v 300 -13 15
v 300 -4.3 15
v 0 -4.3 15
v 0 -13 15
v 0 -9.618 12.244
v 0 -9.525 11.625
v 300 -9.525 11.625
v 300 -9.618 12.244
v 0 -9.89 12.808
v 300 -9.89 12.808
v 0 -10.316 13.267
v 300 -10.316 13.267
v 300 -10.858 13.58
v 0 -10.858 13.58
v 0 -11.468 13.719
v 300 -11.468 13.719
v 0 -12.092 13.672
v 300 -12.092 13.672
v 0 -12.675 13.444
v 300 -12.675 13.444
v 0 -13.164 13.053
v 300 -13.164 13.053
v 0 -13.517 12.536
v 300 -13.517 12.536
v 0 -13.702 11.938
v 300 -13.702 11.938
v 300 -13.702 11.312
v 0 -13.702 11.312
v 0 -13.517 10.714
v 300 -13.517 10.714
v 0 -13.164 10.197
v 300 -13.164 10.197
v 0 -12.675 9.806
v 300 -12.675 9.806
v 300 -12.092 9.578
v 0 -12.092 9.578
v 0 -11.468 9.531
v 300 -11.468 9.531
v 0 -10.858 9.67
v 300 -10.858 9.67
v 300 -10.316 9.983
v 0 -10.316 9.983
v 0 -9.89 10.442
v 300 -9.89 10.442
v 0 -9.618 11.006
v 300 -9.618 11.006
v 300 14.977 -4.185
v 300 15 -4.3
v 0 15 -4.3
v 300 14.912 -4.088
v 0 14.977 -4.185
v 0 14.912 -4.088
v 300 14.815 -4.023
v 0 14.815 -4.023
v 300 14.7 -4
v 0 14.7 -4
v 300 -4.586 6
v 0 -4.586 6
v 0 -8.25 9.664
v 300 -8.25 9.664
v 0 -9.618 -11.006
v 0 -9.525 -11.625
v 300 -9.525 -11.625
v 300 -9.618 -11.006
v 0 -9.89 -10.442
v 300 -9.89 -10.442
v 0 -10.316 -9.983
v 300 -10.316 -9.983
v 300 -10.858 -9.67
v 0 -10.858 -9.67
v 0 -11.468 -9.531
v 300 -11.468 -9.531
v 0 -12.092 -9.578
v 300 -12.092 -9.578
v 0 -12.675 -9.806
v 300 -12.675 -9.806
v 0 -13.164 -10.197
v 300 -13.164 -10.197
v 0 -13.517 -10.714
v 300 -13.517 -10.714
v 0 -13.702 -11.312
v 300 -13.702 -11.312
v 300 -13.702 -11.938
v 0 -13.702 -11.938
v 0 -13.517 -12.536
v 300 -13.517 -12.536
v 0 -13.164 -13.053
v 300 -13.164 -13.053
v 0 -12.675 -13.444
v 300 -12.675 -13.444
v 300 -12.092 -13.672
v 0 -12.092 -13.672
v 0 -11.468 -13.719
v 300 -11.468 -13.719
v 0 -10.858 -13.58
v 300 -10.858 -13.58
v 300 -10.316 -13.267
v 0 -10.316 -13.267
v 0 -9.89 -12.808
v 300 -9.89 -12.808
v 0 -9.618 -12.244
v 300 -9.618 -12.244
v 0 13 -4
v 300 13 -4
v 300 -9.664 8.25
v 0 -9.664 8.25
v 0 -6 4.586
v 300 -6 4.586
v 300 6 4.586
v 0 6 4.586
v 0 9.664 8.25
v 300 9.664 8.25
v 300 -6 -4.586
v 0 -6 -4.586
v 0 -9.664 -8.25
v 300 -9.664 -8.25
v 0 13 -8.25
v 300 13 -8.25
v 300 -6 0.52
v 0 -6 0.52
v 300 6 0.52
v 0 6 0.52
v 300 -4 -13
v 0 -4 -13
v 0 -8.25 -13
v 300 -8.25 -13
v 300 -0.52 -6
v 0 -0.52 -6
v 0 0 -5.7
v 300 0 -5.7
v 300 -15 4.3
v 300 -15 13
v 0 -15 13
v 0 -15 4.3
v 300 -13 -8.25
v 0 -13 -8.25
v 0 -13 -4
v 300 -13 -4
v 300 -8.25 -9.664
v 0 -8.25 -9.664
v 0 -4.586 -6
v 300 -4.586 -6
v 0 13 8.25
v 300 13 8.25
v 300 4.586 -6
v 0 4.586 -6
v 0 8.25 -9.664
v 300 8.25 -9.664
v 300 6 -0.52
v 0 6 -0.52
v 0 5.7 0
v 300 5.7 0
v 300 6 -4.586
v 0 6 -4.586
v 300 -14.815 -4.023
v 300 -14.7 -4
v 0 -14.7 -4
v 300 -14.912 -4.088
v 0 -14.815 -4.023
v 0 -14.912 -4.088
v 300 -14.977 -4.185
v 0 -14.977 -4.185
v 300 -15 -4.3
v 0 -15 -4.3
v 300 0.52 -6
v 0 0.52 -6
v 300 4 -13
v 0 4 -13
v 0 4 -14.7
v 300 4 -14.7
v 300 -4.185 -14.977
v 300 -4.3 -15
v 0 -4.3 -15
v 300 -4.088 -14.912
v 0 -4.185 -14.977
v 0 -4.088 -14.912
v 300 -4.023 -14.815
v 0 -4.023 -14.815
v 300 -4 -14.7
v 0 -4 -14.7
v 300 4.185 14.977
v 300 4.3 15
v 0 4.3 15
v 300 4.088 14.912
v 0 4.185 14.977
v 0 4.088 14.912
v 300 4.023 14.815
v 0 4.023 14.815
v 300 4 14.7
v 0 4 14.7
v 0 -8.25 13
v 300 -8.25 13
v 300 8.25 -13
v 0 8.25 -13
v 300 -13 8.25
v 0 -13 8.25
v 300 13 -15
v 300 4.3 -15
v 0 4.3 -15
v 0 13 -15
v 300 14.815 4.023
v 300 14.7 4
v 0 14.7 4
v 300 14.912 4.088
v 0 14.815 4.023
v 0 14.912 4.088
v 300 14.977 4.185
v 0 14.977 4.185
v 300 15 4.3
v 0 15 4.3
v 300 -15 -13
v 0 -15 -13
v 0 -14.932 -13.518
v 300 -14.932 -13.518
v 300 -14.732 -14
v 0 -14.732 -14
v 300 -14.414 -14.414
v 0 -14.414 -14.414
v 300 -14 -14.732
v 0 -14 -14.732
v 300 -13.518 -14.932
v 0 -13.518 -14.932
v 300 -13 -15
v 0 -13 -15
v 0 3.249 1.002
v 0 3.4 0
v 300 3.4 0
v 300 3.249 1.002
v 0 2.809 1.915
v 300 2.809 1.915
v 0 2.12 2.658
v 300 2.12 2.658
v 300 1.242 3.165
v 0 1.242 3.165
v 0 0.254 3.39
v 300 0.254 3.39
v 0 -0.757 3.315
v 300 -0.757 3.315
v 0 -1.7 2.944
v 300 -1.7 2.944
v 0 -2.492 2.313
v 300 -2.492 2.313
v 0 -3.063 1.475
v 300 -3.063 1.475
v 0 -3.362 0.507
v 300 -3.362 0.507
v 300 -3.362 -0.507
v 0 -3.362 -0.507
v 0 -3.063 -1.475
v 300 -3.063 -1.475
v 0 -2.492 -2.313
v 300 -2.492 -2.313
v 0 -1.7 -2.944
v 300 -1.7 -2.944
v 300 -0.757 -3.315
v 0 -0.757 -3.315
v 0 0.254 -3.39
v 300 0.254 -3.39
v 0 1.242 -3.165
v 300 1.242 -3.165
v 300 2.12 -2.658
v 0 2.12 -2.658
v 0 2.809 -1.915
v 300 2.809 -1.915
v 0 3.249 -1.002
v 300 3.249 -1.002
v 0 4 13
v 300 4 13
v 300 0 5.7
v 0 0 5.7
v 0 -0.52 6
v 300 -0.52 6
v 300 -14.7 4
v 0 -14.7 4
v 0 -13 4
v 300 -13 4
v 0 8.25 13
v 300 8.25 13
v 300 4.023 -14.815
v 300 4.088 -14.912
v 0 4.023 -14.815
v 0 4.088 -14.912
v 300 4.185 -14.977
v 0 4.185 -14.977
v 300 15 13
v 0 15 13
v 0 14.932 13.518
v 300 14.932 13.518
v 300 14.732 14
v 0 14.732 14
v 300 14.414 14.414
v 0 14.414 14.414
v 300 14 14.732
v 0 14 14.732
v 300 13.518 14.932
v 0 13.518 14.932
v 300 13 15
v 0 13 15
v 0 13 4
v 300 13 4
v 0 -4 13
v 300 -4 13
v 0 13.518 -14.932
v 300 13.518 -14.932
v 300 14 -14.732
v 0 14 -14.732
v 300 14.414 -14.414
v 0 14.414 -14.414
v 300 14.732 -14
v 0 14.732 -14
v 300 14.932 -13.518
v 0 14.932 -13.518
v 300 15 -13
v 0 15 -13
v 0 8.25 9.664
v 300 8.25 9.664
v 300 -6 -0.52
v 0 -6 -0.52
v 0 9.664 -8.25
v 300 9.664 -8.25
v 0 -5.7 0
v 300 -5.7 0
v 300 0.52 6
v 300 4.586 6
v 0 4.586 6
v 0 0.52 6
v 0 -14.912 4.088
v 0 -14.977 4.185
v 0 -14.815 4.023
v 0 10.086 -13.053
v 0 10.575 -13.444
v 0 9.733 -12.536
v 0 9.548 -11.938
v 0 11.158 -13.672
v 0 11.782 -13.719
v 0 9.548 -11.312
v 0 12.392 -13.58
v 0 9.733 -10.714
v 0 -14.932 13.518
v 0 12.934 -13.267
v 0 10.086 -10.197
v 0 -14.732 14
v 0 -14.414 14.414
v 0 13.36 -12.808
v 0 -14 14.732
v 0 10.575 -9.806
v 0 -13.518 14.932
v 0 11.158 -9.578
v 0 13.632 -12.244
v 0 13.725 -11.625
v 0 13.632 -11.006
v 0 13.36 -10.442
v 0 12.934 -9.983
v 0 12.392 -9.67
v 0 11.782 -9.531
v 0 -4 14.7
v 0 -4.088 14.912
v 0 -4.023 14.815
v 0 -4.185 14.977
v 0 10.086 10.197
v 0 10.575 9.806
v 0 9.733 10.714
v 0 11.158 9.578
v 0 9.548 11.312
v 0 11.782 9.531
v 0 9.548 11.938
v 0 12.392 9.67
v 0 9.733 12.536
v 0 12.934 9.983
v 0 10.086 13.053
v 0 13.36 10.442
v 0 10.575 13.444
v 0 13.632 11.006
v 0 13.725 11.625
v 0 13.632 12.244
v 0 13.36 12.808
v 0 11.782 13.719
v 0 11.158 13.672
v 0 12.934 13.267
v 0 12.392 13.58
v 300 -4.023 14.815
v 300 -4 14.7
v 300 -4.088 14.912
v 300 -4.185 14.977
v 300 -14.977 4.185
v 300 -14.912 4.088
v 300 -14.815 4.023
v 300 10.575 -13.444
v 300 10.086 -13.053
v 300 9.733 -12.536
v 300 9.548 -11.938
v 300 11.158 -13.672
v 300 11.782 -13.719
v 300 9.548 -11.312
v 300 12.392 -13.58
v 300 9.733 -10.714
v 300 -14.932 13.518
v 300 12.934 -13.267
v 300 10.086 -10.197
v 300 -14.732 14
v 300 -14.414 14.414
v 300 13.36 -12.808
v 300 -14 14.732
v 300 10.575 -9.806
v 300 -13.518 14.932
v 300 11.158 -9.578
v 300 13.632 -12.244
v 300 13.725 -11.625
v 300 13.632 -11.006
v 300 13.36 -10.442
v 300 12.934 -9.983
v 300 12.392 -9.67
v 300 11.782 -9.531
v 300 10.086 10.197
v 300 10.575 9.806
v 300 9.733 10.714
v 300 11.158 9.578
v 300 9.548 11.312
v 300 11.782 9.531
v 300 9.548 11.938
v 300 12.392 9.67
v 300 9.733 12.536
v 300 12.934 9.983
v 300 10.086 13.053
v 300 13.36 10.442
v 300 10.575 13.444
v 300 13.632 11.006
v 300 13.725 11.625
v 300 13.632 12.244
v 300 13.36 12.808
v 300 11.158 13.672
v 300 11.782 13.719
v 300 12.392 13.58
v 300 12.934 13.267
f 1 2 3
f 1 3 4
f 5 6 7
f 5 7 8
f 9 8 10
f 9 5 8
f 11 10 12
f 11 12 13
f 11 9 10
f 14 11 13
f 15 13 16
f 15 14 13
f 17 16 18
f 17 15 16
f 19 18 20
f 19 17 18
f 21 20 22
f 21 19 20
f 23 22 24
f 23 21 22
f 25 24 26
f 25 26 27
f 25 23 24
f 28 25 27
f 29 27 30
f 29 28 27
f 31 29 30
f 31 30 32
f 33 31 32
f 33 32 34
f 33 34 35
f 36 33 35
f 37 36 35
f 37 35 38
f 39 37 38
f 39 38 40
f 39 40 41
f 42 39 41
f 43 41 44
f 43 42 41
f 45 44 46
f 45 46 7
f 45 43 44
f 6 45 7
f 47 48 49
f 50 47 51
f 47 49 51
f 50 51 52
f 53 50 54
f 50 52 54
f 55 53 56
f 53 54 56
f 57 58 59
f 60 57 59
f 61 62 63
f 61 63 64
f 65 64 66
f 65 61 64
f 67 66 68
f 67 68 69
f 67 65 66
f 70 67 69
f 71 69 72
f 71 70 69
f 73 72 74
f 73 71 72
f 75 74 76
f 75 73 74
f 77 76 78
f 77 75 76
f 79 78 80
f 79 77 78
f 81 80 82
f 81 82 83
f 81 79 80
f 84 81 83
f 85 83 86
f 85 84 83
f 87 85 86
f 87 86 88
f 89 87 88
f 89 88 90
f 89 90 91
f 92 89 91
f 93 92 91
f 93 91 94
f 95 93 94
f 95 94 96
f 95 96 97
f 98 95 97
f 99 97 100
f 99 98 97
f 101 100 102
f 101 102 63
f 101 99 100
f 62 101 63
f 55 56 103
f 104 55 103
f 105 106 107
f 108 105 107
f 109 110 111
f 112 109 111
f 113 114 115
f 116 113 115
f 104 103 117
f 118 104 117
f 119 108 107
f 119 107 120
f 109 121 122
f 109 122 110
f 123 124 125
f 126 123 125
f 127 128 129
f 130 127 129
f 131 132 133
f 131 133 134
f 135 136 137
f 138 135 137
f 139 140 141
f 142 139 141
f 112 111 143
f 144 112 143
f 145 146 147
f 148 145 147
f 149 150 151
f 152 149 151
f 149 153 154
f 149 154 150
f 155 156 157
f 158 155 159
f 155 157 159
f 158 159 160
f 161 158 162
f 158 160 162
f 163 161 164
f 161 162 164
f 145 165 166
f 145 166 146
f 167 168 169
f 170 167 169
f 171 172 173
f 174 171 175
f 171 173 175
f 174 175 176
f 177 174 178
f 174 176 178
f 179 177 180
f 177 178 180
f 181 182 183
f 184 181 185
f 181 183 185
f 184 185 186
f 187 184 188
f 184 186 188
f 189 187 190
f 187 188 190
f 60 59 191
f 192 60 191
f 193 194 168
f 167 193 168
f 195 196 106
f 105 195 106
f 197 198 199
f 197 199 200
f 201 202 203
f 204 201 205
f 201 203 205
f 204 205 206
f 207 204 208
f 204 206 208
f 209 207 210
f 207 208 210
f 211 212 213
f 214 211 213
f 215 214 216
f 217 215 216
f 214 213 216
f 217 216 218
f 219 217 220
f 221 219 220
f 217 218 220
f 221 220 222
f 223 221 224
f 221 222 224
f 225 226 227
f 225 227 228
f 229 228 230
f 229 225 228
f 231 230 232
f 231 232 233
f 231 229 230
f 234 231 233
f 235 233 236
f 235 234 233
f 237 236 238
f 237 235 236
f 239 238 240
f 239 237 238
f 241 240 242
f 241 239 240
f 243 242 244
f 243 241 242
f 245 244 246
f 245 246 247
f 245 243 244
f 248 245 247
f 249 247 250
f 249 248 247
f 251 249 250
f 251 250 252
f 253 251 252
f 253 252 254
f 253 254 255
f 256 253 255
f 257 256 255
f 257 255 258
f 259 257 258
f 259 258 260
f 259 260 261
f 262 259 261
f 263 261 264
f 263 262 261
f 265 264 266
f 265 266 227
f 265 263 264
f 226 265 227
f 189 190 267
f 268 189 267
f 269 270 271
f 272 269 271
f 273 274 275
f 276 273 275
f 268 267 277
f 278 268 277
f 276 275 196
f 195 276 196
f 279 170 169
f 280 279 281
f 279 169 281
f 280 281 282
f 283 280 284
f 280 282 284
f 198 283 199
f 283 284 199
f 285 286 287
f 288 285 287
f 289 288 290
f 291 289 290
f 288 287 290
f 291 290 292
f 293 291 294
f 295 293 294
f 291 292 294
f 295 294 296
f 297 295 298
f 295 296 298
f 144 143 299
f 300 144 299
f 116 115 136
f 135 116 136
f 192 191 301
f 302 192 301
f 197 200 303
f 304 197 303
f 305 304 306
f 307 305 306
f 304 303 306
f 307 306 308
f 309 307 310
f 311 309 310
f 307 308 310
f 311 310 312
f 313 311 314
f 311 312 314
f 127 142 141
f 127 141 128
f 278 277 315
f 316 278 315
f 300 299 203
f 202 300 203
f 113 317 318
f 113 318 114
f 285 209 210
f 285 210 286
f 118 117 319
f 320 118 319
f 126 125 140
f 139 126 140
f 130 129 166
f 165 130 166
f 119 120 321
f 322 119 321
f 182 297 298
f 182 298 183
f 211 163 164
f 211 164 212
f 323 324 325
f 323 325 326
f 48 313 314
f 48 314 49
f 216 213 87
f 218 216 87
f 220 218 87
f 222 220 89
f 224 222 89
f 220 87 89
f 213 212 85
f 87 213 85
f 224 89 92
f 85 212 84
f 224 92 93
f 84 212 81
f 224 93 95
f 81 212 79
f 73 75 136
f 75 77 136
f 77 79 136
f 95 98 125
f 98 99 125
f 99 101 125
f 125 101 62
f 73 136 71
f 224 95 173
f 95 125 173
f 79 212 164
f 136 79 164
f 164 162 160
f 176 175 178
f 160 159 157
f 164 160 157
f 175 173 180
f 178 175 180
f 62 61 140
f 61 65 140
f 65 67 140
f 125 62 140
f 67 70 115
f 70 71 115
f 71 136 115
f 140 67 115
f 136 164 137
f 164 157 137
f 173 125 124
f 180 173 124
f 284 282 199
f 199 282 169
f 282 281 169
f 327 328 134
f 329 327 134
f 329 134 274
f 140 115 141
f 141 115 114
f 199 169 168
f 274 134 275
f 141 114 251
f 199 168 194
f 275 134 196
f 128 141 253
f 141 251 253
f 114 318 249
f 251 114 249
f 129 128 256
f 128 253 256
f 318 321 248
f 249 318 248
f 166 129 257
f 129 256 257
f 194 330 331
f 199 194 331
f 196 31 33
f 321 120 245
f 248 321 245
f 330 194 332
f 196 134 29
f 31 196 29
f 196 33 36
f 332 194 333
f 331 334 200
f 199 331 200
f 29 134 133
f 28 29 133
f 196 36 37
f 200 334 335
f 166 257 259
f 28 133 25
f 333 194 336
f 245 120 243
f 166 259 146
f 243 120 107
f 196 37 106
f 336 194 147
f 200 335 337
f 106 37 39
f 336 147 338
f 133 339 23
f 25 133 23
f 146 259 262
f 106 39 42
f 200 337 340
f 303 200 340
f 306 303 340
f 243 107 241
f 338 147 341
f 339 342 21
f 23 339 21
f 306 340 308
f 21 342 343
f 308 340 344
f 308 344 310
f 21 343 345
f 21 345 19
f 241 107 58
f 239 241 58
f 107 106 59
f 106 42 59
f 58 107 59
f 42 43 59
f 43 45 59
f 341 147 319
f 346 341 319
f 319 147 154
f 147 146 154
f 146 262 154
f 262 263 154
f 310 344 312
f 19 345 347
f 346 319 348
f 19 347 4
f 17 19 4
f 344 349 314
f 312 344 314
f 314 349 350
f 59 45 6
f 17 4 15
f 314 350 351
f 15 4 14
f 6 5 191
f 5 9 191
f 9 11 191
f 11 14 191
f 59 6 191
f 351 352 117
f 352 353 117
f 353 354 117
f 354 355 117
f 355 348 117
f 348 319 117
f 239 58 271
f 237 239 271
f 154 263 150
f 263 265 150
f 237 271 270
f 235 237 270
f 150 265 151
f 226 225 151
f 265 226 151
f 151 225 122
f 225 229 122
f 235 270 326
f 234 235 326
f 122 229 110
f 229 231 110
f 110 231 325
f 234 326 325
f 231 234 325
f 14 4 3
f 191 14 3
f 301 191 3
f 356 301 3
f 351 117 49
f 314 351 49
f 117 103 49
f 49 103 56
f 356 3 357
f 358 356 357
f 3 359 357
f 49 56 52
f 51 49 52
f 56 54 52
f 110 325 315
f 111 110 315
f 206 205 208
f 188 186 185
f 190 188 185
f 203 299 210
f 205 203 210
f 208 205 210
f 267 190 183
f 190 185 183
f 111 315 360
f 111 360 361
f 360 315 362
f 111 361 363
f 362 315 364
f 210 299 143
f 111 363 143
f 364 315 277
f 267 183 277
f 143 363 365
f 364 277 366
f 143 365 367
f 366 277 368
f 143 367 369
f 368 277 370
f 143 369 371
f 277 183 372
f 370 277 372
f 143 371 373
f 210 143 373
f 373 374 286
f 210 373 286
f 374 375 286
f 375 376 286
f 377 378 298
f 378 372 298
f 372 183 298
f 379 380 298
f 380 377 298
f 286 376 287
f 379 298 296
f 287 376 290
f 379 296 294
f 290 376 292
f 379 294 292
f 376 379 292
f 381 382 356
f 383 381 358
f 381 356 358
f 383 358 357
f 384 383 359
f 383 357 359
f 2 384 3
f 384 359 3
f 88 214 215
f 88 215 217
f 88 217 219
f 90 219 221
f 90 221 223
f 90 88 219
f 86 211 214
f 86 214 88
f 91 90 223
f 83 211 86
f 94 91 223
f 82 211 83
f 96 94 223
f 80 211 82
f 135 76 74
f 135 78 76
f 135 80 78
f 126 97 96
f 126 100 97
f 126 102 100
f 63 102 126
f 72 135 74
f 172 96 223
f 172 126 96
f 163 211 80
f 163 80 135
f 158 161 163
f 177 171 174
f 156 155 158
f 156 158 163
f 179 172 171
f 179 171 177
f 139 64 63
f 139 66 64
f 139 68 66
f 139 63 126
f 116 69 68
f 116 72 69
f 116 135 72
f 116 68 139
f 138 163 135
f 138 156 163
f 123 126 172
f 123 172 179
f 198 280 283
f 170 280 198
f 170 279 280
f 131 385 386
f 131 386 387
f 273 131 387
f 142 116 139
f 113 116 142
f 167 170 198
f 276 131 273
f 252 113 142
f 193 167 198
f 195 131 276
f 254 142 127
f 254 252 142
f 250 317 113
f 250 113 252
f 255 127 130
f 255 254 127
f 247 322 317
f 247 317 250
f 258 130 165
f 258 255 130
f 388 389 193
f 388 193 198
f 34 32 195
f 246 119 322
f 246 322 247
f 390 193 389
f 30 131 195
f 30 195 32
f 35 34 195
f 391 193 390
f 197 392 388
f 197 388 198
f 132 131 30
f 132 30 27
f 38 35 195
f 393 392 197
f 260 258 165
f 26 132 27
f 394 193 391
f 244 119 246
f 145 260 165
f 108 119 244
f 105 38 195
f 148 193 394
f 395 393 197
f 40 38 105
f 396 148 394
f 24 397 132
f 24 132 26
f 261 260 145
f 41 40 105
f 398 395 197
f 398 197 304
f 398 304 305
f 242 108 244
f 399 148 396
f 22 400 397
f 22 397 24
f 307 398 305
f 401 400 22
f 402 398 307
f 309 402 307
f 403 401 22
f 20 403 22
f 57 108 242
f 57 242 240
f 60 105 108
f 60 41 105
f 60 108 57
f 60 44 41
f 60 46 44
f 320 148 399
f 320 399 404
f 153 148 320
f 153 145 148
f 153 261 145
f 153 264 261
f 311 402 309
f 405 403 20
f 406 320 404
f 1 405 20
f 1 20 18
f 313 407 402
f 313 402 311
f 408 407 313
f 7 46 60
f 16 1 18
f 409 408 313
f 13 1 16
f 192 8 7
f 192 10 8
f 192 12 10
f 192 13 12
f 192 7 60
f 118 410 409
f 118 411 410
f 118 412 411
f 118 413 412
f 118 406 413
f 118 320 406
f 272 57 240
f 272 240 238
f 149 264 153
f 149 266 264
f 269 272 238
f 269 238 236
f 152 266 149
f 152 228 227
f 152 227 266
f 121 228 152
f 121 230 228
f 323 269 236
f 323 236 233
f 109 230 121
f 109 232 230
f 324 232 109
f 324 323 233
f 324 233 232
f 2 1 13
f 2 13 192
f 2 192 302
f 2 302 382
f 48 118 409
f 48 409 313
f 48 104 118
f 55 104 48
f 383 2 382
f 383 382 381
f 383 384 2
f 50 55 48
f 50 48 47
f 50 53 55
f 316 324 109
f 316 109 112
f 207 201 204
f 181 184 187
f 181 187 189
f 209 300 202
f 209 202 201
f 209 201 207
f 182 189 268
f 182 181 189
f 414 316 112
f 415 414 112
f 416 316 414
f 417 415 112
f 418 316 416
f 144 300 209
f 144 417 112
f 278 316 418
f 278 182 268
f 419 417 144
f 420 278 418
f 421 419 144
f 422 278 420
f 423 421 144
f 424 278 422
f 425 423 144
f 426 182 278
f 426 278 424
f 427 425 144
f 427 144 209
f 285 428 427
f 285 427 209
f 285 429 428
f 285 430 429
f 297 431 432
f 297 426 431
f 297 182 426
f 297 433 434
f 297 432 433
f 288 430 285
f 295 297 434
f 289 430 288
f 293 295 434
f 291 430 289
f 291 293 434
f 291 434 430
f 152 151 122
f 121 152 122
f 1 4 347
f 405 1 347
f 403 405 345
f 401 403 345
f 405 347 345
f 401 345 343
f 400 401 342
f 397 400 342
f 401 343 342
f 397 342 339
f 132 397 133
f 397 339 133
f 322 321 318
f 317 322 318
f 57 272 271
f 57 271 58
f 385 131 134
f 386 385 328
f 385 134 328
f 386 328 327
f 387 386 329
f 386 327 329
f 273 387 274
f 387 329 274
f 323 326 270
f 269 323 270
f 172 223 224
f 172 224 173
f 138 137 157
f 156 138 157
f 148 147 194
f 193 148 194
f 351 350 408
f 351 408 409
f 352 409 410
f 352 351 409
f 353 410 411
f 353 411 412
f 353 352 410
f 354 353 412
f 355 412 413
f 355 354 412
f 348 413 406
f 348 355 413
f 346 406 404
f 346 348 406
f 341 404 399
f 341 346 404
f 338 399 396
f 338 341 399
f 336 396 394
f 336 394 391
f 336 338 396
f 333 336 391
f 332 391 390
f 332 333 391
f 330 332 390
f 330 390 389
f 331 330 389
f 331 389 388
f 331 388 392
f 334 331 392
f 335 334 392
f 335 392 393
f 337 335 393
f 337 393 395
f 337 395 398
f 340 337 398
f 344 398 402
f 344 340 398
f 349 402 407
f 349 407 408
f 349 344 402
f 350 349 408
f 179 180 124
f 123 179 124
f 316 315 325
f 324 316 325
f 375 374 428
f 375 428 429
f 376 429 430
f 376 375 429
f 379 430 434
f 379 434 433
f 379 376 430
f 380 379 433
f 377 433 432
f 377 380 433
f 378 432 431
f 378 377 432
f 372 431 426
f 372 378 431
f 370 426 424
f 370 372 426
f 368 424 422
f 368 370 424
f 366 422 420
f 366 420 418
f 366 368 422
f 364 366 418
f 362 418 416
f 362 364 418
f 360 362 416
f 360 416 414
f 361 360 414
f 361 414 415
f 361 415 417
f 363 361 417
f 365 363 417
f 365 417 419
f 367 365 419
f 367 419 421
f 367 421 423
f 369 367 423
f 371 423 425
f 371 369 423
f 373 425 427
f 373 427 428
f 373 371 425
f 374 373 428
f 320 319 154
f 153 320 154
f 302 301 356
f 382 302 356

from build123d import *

# Parameters (mm, degrees)
SKETCH_1_R              = 2.1
SKETCH_1_R_2            = 3.4
F_30XS6_30X30S6_1_DEPTH = 300


with BuildPart() as part:
    # 草图1 → 30xs6 30X30S6(1) (new body)
    with BuildSketch(Plane.YZ):
        with BuildLine():
            Line((-14.7, 4), (-13, 4))
            Line((-13, 4), (-13, 8.25))
            Line((-13, 8.25), (-9.664213562, 8.25))
            Line((-9.664213562, 8.25), (-6, 4.585786438))
            Line((-6, 4.585786438), (-6, 0.519615242))
            Line((-6, 0.519615242), (-5.7, 0))
            Line((-5.7, 0), (-6, -0.519615242))
            Line((-6, -0.519615242), (-6, -4.585786438))
            Line((-6, -4.585786438), (-9.664213562, -8.25))
            Line((-9.664213562, -8.25), (-13, -8.25))
            Line((-13, -8.25), (-13, -4))
            Line((-13, -4), (-14.7, -4))
            ThreePointArc((-14.7, -4), (-14.912132034, -4.087867966), (-15, -4.3))
            Line((-15, -4.3), (-15, -13))
            ThreePointArc((-15, -13), (-14.414213562, -14.414213562), (-13, -15))
            Line((-13, -15), (-4.3, -15))
            ThreePointArc((-4.3, -15), (-4.087867966, -14.912132034), (-4, -14.7))
            Line((-4, -14.7), (-4, -13))
            Line((-4, -13), (-8.25, -13))
            Line((-8.25, -13), (-8.25, -9.664213562))
            Line((-8.25, -9.664213562), (-4.585786438, -6))
            Line((-4.585786438, -6), (-0.519615242, -6))
            Line((-0.519615242, -6), (0, -5.7))
            Line((0, -5.7), (0.519615242, -6))
            Line((0.519615242, -6), (4.585786438, -6))
            Line((4.585786438, -6), (8.25, -9.664213562))
            Line((8.25, -9.664213562), (8.25, -13))
            Line((8.25, -13), (4, -13))
            Line((4, -13), (4, -14.7))
            ThreePointArc((4, -14.7), (4.087867966, -14.912132034), (4.3, -15))
            Line((4.3, -15), (13, -15))
            ThreePointArc((13, -15), (14.414213562, -14.414213562), (15, -13))
            Line((15, -13), (15, -4.3))
            ThreePointArc((15, -4.3), (14.912132034, -4.087867966), (14.7, -4))
            Line((14.7, -4), (13, -4))
            Line((13, -4), (13, -8.25))
            Line((13, -8.25), (9.664213562, -8.25))
            Line((9.664213562, -8.25), (6, -4.585786438))
            Line((6, -4.585786438), (6, -0.519615242))
            Line((6, -0.519615242), (5.7, 0))
            Line((5.7, 0), (6, 0.519615242))
            Line((6, 0.519615242), (6, 4.585786438))
            Line((6, 4.585786438), (9.664213562, 8.25))
            Line((9.664213562, 8.25), (13, 8.25))
            Line((13, 8.25), (13, 4))
            Line((13, 4), (14.7, 4))
            ThreePointArc((14.7, 4), (14.912132034, 4.087867966), (15, 4.3))
            Line((15, 4.3), (15, 13))
            ThreePointArc((15, 13), (14.414213562, 14.414213562), (13, 15))
            Line((13, 15), (4.3, 15))
            ThreePointArc((4.3, 15), (4.087867966, 14.912132034), (4, 14.7))
            Line((4, 14.7), (4, 13))
            Line((4, 13), (8.25, 13))
            Line((8.25, 13), (8.25, 9.664213562))
            Line((8.25, 9.664213562), (4.585786438, 6))
            Line((4.585786438, 6), (0.519615242, 6))
            Line((0.519615242, 6), (0, 5.7))
            Line((0, 5.7), (-0.519615242, 6))
            Line((-0.519615242, 6), (-4.585786438, 6))
            Line((-4.585786438, 6), (-8.25, 9.664213562))
            Line((-8.25, 9.664213562), (-8.25, 13))
            Line((-8.25, 13), (-4, 13))
            Line((-4, 13), (-4, 14.7))
            ThreePointArc((-4, 14.7), (-4.087867966, 14.912132034), (-4.3, 15))
            Line((-4.3, 15), (-13, 15))
            ThreePointArc((-13, 15), (-14.414213562, 14.414213562), (-15, 13))
            Line((-15, 13), (-15, 4.3))
            ThreePointArc((-15, 4.3), (-14.912132034, 4.087867966), (-14.7, 4))
        make_face()
        with Locations((11.625, 11.625)):
            Circle(SKETCH_1_R, mode=Mode.SUBTRACT)
        with Locations((11.625, -11.625)):
            Circle(SKETCH_1_R, mode=Mode.SUBTRACT)
        Circle(SKETCH_1_R_2, mode=Mode.SUBTRACT)
        with Locations((-11.625, -11.625)):
            Circle(SKETCH_1_R, mode=Mode.SUBTRACT)
        with Locations((-11.625, 11.625)):
            Circle(SKETCH_1_R, mode=Mode.SUBTRACT)
    extrude(amount=F_30XS6_30X30S6_1_DEPTH)


solid = part.part
